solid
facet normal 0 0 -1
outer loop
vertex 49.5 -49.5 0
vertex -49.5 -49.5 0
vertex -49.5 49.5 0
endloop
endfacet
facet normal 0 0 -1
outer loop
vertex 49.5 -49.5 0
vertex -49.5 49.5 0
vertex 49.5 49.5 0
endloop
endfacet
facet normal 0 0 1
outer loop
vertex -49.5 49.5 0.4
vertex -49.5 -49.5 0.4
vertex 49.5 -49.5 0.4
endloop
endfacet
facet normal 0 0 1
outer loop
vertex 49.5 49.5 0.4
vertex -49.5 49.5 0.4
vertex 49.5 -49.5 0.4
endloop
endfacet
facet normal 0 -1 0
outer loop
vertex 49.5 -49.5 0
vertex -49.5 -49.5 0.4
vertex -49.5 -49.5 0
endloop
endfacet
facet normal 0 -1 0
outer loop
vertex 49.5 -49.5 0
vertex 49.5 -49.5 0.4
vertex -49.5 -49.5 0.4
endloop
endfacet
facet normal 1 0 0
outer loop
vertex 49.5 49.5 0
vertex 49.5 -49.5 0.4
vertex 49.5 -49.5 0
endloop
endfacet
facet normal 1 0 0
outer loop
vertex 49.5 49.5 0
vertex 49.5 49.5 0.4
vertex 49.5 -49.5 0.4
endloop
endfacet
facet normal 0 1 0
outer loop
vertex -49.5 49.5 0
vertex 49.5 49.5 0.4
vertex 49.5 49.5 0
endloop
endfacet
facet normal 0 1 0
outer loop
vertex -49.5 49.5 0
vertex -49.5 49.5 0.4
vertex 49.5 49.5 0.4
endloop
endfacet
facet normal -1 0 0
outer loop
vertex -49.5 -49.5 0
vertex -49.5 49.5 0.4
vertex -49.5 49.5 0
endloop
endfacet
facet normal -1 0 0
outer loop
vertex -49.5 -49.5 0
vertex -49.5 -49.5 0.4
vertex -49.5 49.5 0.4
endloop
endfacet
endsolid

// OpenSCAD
// [FL_INDEX: keywords="openscad, 3d_parametric, Customisable_Lithophane_with_More, csg_solid" | COT="Parametric OpenSCAD design from 3DCodeverse"]
// Title: Customisable Lithophane with More

/* 
 * Based on Customizable Lithopane http://www.thingiverse.com/thing:74322
 * 
 * Added ability to remove hook hole and specify border sizes
 * Fixed X/Y size to match surface() returned size and added smidgen to difference.
 *
 */

// preview[view:south, tilt:top]

/* [Image] */

// Load a 100x100 pixel image.(images will be stretched to fit) Simple photos work best. Don't forget to click the Invert Colors checkbox!
image_file = "image-surface.dat"; // [image_surface:100x100]

/* [Adjustments] */
// Set both hole values to zero for no hole
hole_diameter = 0;
hole_border = 0;
// Zero for no border
lithophane_border = 0;

// What layer height will you slice this at?  The thinner the better.
layer_height = 0.2;

// The lower the layer height, the more layers you can use.
number_of_layers = 12; // [5:20]

/* [Hidden] */
s=0.01;
length = 99; // surface() produces a n-1 object
width = 99;  // bug in surface drops last line

// base (white) will always be 2 layers thick
min_layer_height = layer_height*2;
hole_radius = hole_diameter/2;
height = layer_height*number_of_layers;
 
union() {
  // take just the part of surface we want
  difference() {
    translate([0, 0, min_layer_height]) scale([1,1,height]) surface(file=image_file, center=true, convexity=5);
	// -
    translate([0,0,-(height+min_layer_height)]) linear_extrude(height=height+min_layer_height) square([length+s, width+s], center=true);
  } // d
  linear_extrude(height=layer_height*2) square([length+lithophane_border, width+lithophane_border], center=true);

  linear_extrude(height=height+min_layer_height){
	  difference(){
		union(){
	      square([length+lithophane_border, width+lithophane_border], center=true);
		  translate([0, width/2+hole_radius+lithophane_border/2, 0])
		    circle(r=hole_radius+ hole_border);
		} // u
		// -
	    union(){
	      square([length, width], center=true);
		  translate([0, width/2+hole_radius+lithophane_border/2, 0])
	        circle(r=hole_radius);
	    } // u
	  } // d
  } // le
} // u
